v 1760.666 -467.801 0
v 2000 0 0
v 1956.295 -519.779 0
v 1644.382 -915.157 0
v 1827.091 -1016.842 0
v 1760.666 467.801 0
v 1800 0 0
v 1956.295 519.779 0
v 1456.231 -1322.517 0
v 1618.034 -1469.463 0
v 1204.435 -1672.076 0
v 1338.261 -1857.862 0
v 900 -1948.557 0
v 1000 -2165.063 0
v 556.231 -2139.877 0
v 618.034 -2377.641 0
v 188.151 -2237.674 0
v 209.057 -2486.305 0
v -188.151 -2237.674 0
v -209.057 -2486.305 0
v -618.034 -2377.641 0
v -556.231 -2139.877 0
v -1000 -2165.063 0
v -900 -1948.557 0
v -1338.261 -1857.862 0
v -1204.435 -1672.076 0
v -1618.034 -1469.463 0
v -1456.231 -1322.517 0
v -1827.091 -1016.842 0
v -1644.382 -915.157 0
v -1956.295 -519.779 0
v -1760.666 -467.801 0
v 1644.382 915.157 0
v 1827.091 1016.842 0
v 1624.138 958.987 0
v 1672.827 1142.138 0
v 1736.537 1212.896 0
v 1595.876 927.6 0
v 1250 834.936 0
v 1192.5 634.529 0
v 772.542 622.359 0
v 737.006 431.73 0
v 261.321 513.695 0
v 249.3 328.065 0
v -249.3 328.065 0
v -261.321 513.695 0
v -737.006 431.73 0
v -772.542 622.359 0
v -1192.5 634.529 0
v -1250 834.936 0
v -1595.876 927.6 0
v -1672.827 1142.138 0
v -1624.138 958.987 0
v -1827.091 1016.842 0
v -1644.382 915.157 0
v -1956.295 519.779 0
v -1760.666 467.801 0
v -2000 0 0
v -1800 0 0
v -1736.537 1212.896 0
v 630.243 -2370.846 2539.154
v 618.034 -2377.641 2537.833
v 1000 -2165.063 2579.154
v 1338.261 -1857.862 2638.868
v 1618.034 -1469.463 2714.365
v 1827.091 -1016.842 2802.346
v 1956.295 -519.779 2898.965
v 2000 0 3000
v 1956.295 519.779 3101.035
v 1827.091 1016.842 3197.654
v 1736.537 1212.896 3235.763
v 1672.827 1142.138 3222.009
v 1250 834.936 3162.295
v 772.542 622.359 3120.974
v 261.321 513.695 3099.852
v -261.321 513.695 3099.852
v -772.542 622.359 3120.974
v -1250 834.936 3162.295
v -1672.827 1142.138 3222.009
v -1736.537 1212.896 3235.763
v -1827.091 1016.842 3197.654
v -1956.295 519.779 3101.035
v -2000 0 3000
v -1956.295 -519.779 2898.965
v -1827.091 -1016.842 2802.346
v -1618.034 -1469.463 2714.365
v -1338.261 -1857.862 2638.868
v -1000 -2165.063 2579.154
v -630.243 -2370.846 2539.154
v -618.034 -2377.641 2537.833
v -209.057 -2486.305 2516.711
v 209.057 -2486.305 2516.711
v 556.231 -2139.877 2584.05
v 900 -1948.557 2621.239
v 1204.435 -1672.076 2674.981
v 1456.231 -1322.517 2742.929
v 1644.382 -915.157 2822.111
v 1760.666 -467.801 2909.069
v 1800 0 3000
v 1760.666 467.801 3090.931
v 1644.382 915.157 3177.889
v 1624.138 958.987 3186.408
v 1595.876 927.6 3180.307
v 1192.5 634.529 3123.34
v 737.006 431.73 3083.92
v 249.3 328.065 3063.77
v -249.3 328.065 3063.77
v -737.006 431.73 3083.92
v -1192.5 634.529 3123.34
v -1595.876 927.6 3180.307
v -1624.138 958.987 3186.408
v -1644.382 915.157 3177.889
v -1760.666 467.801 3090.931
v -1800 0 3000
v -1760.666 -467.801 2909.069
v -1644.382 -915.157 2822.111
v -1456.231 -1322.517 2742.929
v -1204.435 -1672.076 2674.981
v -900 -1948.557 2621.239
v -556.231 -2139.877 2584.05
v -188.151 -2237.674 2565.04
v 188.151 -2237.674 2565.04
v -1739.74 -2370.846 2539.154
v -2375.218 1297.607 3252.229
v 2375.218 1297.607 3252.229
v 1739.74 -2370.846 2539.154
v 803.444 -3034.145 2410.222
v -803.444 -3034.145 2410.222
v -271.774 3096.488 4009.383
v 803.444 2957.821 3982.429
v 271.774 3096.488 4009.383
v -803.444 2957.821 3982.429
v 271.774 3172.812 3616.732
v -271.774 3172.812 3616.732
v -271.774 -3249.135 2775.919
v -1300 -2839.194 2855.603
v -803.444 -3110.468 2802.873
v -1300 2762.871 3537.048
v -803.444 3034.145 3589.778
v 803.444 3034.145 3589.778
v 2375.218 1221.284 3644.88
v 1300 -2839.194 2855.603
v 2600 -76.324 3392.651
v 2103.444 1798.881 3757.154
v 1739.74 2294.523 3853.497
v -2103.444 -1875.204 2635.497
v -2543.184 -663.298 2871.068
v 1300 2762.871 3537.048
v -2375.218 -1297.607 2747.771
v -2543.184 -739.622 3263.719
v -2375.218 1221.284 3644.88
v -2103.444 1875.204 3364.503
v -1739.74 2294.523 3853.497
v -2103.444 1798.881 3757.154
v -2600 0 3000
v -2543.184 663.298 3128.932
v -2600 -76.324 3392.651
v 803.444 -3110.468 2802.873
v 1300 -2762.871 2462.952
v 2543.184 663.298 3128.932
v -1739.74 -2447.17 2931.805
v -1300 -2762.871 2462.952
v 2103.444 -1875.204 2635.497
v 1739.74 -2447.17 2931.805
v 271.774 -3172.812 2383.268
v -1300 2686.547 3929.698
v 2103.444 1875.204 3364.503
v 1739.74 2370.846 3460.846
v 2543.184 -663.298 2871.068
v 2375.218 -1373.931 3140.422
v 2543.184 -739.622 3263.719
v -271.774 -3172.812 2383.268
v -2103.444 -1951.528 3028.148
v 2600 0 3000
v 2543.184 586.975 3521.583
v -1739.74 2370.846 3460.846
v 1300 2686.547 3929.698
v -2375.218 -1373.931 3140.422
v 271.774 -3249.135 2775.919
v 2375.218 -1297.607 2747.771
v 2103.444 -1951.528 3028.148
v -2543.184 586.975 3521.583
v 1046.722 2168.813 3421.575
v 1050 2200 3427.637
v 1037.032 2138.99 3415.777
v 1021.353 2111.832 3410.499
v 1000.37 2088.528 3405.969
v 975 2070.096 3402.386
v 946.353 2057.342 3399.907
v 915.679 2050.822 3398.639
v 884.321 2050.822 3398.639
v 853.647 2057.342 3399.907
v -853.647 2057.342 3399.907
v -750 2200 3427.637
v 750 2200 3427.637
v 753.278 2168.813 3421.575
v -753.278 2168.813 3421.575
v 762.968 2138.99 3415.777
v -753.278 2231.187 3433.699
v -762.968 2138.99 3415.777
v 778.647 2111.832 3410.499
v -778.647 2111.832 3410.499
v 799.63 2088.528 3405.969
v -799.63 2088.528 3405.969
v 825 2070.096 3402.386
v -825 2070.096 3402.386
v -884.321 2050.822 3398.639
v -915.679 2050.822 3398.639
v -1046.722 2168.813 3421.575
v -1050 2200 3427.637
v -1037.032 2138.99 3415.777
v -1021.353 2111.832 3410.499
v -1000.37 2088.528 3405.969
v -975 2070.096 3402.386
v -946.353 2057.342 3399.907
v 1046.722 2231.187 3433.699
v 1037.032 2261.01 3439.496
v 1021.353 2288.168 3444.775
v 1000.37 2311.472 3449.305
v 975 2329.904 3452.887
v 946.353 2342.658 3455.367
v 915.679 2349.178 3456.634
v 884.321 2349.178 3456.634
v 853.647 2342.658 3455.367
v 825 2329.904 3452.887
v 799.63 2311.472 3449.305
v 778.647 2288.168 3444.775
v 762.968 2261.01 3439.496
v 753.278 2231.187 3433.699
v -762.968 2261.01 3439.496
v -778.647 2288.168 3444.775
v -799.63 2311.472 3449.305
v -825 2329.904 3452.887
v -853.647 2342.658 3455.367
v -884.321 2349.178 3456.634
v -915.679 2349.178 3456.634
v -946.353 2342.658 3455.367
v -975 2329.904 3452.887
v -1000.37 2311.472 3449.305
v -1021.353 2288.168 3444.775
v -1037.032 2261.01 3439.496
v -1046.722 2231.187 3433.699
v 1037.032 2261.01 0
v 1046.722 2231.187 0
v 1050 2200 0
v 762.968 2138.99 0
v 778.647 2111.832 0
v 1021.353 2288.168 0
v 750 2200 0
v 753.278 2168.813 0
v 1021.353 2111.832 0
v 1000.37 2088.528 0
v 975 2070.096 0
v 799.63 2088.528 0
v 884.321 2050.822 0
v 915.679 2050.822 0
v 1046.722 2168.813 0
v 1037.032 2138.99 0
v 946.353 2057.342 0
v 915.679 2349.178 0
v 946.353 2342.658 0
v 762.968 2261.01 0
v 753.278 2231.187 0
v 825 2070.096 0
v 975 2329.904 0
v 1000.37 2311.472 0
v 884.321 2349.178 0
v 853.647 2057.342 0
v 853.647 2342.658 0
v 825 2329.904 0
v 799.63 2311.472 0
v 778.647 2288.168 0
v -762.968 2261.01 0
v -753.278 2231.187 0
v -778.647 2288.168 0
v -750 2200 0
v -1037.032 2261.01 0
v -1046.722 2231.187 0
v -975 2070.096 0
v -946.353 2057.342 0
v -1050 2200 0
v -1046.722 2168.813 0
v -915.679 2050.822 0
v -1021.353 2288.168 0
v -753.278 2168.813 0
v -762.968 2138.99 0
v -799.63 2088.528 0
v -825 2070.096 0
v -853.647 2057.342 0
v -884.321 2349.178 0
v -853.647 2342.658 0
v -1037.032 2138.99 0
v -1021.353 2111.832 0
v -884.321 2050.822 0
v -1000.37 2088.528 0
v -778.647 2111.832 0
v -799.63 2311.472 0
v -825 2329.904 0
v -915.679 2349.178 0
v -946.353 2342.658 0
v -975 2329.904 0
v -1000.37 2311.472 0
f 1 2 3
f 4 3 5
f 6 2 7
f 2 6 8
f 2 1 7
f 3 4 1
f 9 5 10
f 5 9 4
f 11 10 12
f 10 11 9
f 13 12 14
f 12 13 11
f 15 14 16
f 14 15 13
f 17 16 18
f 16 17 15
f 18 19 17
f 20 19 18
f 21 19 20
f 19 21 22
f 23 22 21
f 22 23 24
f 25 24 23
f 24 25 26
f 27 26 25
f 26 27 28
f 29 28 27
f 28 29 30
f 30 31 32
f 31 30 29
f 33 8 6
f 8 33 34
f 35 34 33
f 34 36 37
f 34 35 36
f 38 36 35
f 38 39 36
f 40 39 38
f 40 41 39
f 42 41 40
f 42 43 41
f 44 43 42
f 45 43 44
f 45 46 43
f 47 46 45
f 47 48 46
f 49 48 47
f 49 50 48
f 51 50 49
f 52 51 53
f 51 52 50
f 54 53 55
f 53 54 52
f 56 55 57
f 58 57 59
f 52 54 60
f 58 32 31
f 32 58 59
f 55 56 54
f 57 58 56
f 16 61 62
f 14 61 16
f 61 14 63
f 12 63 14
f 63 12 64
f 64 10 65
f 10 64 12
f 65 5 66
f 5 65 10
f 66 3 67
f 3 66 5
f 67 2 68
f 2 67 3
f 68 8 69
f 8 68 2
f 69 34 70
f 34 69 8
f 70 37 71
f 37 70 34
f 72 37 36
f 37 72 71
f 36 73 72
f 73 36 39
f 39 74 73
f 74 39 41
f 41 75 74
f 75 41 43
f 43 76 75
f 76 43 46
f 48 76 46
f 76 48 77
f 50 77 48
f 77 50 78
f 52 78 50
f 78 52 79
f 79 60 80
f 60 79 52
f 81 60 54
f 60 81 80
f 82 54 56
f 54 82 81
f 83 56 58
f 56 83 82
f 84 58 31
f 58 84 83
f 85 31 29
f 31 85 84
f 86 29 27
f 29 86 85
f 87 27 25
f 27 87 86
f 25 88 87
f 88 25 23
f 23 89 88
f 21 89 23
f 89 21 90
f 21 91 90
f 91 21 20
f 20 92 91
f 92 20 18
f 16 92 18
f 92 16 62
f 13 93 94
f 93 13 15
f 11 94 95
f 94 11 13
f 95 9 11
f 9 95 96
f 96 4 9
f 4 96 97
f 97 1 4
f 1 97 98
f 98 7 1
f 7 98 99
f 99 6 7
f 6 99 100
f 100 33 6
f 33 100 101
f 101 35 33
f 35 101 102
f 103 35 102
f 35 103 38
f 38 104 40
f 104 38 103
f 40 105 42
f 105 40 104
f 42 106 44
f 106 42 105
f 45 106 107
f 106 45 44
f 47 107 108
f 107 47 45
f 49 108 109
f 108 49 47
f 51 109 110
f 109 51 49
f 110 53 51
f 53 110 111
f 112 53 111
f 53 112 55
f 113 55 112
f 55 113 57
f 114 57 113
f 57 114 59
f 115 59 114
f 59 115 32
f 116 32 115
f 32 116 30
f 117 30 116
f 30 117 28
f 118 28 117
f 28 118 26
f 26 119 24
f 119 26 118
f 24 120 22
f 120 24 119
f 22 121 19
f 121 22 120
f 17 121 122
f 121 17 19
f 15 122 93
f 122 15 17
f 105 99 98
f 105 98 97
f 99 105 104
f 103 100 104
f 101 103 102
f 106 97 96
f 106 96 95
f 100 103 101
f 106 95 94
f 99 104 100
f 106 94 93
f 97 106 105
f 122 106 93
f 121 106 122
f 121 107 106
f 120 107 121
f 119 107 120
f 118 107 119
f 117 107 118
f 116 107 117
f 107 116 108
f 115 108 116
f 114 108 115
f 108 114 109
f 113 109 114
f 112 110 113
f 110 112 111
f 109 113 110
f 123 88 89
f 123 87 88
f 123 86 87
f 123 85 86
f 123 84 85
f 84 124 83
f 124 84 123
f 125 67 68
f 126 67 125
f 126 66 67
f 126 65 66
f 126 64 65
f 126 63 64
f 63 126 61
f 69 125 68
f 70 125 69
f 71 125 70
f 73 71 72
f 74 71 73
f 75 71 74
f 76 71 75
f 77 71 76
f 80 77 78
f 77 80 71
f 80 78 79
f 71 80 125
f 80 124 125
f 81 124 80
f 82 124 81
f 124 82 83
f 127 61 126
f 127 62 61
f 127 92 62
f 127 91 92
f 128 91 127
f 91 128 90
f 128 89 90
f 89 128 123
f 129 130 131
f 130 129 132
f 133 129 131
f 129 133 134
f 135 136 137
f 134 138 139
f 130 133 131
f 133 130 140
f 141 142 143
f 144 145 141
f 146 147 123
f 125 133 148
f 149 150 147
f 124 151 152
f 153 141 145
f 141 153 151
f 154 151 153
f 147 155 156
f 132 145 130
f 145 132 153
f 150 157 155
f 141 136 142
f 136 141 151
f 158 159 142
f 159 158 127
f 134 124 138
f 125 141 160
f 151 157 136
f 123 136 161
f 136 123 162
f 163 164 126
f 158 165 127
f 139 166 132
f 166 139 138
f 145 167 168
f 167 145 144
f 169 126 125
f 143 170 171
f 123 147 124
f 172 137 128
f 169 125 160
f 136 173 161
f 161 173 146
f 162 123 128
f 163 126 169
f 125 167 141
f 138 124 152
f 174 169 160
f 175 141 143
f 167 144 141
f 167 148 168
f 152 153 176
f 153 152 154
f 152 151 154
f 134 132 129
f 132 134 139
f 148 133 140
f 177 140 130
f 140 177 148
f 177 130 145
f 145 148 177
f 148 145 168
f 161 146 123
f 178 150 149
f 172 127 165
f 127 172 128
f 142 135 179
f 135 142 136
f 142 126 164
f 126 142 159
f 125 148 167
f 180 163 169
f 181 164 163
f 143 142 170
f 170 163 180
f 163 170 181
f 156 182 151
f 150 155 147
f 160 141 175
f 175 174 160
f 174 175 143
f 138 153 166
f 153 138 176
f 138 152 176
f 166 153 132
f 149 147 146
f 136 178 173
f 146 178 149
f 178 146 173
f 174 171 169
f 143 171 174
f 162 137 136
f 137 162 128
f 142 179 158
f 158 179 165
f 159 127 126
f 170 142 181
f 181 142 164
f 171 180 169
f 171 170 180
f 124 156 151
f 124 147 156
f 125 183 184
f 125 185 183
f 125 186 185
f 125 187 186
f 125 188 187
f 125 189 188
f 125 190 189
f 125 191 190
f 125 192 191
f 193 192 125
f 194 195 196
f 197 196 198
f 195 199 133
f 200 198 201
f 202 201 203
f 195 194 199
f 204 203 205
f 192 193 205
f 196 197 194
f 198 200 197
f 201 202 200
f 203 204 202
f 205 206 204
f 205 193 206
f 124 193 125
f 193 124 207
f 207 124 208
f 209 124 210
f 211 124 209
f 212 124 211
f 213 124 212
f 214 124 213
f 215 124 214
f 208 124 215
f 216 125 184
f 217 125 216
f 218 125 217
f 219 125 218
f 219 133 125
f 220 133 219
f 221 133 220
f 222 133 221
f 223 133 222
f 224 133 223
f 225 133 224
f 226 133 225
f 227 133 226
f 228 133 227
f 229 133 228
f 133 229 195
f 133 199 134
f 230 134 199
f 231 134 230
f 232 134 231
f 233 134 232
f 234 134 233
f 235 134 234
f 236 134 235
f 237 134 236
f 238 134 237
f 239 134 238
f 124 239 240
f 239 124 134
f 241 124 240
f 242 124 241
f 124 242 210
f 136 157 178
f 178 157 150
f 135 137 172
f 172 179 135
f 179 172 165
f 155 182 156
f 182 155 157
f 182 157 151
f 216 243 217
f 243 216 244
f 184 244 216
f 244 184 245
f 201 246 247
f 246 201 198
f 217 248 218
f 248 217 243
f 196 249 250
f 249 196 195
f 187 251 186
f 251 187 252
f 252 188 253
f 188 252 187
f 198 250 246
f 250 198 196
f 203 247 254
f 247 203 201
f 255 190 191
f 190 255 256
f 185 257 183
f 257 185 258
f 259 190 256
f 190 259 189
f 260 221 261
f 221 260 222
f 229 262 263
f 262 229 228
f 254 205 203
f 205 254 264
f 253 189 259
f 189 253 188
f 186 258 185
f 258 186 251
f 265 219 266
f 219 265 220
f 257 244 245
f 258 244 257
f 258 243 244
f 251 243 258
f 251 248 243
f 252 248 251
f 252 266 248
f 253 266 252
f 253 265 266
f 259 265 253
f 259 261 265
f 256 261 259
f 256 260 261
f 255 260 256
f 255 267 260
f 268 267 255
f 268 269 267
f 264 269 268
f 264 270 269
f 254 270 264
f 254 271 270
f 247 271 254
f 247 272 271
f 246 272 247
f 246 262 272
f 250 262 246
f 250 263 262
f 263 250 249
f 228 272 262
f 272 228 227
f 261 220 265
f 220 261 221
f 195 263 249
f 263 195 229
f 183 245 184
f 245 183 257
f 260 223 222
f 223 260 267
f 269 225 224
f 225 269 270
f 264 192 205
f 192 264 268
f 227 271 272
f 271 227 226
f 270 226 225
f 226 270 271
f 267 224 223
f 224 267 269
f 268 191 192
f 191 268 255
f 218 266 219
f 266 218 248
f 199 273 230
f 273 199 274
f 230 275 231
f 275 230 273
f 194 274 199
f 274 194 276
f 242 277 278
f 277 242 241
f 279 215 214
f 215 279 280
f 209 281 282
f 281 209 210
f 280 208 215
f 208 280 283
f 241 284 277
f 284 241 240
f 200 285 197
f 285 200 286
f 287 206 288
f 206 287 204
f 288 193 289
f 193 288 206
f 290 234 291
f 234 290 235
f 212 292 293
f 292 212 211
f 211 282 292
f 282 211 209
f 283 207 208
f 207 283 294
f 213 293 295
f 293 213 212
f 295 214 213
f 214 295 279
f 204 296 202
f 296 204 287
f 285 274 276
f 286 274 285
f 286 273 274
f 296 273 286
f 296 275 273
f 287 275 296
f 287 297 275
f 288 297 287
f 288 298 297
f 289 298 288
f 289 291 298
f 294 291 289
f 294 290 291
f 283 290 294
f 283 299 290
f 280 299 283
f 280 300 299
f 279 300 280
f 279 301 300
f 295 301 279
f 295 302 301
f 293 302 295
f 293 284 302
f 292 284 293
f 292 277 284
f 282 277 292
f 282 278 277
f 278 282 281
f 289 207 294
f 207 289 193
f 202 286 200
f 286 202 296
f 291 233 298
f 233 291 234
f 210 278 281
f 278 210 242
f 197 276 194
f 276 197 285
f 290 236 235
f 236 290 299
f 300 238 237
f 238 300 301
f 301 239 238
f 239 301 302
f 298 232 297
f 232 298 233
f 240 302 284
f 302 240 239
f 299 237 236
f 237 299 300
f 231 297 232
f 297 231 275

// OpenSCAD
s_x = 4000;
s_y = 5000;
height = 3000;
roof_th = 400;

module outer_shape(x, y, th) {
    difference() {
        scale([1, y/x]) circle(d=x);
        translate([0, 1.2*y/2]) circle(d = y + th);
    }
}

module add_roof(x, y, th, show = true) {
    module roof(h, th) {
        translate([0, 0, h])
        rotate([11, 0, 0])
        linear_extrude(th)
        scale(1.3) scale([1, y/x]) circle(d=x);
    }

    if (show) {
        union() {    
            difference() {
                children();
                roof(3000, 4000);
            }
            roof(3000, th);
        }
    } else {
        children();
    }
}

add_roof(s_x, s_y, roof_th)
difference() {
    linear_extrude(height = height + 2000)
    outer_shape(s_x, s_y, 0);
    scale(0.9)
    linear_extrude(height = 3 * (height + 2000), center = true)
    outer_shape(s_x, s_y, 300);
}

translate([900, 2200, 0])
linear_extrude(3500) circle(150);
translate([-900, 2200, 0])
linear_extrude(3500) circle(150);
